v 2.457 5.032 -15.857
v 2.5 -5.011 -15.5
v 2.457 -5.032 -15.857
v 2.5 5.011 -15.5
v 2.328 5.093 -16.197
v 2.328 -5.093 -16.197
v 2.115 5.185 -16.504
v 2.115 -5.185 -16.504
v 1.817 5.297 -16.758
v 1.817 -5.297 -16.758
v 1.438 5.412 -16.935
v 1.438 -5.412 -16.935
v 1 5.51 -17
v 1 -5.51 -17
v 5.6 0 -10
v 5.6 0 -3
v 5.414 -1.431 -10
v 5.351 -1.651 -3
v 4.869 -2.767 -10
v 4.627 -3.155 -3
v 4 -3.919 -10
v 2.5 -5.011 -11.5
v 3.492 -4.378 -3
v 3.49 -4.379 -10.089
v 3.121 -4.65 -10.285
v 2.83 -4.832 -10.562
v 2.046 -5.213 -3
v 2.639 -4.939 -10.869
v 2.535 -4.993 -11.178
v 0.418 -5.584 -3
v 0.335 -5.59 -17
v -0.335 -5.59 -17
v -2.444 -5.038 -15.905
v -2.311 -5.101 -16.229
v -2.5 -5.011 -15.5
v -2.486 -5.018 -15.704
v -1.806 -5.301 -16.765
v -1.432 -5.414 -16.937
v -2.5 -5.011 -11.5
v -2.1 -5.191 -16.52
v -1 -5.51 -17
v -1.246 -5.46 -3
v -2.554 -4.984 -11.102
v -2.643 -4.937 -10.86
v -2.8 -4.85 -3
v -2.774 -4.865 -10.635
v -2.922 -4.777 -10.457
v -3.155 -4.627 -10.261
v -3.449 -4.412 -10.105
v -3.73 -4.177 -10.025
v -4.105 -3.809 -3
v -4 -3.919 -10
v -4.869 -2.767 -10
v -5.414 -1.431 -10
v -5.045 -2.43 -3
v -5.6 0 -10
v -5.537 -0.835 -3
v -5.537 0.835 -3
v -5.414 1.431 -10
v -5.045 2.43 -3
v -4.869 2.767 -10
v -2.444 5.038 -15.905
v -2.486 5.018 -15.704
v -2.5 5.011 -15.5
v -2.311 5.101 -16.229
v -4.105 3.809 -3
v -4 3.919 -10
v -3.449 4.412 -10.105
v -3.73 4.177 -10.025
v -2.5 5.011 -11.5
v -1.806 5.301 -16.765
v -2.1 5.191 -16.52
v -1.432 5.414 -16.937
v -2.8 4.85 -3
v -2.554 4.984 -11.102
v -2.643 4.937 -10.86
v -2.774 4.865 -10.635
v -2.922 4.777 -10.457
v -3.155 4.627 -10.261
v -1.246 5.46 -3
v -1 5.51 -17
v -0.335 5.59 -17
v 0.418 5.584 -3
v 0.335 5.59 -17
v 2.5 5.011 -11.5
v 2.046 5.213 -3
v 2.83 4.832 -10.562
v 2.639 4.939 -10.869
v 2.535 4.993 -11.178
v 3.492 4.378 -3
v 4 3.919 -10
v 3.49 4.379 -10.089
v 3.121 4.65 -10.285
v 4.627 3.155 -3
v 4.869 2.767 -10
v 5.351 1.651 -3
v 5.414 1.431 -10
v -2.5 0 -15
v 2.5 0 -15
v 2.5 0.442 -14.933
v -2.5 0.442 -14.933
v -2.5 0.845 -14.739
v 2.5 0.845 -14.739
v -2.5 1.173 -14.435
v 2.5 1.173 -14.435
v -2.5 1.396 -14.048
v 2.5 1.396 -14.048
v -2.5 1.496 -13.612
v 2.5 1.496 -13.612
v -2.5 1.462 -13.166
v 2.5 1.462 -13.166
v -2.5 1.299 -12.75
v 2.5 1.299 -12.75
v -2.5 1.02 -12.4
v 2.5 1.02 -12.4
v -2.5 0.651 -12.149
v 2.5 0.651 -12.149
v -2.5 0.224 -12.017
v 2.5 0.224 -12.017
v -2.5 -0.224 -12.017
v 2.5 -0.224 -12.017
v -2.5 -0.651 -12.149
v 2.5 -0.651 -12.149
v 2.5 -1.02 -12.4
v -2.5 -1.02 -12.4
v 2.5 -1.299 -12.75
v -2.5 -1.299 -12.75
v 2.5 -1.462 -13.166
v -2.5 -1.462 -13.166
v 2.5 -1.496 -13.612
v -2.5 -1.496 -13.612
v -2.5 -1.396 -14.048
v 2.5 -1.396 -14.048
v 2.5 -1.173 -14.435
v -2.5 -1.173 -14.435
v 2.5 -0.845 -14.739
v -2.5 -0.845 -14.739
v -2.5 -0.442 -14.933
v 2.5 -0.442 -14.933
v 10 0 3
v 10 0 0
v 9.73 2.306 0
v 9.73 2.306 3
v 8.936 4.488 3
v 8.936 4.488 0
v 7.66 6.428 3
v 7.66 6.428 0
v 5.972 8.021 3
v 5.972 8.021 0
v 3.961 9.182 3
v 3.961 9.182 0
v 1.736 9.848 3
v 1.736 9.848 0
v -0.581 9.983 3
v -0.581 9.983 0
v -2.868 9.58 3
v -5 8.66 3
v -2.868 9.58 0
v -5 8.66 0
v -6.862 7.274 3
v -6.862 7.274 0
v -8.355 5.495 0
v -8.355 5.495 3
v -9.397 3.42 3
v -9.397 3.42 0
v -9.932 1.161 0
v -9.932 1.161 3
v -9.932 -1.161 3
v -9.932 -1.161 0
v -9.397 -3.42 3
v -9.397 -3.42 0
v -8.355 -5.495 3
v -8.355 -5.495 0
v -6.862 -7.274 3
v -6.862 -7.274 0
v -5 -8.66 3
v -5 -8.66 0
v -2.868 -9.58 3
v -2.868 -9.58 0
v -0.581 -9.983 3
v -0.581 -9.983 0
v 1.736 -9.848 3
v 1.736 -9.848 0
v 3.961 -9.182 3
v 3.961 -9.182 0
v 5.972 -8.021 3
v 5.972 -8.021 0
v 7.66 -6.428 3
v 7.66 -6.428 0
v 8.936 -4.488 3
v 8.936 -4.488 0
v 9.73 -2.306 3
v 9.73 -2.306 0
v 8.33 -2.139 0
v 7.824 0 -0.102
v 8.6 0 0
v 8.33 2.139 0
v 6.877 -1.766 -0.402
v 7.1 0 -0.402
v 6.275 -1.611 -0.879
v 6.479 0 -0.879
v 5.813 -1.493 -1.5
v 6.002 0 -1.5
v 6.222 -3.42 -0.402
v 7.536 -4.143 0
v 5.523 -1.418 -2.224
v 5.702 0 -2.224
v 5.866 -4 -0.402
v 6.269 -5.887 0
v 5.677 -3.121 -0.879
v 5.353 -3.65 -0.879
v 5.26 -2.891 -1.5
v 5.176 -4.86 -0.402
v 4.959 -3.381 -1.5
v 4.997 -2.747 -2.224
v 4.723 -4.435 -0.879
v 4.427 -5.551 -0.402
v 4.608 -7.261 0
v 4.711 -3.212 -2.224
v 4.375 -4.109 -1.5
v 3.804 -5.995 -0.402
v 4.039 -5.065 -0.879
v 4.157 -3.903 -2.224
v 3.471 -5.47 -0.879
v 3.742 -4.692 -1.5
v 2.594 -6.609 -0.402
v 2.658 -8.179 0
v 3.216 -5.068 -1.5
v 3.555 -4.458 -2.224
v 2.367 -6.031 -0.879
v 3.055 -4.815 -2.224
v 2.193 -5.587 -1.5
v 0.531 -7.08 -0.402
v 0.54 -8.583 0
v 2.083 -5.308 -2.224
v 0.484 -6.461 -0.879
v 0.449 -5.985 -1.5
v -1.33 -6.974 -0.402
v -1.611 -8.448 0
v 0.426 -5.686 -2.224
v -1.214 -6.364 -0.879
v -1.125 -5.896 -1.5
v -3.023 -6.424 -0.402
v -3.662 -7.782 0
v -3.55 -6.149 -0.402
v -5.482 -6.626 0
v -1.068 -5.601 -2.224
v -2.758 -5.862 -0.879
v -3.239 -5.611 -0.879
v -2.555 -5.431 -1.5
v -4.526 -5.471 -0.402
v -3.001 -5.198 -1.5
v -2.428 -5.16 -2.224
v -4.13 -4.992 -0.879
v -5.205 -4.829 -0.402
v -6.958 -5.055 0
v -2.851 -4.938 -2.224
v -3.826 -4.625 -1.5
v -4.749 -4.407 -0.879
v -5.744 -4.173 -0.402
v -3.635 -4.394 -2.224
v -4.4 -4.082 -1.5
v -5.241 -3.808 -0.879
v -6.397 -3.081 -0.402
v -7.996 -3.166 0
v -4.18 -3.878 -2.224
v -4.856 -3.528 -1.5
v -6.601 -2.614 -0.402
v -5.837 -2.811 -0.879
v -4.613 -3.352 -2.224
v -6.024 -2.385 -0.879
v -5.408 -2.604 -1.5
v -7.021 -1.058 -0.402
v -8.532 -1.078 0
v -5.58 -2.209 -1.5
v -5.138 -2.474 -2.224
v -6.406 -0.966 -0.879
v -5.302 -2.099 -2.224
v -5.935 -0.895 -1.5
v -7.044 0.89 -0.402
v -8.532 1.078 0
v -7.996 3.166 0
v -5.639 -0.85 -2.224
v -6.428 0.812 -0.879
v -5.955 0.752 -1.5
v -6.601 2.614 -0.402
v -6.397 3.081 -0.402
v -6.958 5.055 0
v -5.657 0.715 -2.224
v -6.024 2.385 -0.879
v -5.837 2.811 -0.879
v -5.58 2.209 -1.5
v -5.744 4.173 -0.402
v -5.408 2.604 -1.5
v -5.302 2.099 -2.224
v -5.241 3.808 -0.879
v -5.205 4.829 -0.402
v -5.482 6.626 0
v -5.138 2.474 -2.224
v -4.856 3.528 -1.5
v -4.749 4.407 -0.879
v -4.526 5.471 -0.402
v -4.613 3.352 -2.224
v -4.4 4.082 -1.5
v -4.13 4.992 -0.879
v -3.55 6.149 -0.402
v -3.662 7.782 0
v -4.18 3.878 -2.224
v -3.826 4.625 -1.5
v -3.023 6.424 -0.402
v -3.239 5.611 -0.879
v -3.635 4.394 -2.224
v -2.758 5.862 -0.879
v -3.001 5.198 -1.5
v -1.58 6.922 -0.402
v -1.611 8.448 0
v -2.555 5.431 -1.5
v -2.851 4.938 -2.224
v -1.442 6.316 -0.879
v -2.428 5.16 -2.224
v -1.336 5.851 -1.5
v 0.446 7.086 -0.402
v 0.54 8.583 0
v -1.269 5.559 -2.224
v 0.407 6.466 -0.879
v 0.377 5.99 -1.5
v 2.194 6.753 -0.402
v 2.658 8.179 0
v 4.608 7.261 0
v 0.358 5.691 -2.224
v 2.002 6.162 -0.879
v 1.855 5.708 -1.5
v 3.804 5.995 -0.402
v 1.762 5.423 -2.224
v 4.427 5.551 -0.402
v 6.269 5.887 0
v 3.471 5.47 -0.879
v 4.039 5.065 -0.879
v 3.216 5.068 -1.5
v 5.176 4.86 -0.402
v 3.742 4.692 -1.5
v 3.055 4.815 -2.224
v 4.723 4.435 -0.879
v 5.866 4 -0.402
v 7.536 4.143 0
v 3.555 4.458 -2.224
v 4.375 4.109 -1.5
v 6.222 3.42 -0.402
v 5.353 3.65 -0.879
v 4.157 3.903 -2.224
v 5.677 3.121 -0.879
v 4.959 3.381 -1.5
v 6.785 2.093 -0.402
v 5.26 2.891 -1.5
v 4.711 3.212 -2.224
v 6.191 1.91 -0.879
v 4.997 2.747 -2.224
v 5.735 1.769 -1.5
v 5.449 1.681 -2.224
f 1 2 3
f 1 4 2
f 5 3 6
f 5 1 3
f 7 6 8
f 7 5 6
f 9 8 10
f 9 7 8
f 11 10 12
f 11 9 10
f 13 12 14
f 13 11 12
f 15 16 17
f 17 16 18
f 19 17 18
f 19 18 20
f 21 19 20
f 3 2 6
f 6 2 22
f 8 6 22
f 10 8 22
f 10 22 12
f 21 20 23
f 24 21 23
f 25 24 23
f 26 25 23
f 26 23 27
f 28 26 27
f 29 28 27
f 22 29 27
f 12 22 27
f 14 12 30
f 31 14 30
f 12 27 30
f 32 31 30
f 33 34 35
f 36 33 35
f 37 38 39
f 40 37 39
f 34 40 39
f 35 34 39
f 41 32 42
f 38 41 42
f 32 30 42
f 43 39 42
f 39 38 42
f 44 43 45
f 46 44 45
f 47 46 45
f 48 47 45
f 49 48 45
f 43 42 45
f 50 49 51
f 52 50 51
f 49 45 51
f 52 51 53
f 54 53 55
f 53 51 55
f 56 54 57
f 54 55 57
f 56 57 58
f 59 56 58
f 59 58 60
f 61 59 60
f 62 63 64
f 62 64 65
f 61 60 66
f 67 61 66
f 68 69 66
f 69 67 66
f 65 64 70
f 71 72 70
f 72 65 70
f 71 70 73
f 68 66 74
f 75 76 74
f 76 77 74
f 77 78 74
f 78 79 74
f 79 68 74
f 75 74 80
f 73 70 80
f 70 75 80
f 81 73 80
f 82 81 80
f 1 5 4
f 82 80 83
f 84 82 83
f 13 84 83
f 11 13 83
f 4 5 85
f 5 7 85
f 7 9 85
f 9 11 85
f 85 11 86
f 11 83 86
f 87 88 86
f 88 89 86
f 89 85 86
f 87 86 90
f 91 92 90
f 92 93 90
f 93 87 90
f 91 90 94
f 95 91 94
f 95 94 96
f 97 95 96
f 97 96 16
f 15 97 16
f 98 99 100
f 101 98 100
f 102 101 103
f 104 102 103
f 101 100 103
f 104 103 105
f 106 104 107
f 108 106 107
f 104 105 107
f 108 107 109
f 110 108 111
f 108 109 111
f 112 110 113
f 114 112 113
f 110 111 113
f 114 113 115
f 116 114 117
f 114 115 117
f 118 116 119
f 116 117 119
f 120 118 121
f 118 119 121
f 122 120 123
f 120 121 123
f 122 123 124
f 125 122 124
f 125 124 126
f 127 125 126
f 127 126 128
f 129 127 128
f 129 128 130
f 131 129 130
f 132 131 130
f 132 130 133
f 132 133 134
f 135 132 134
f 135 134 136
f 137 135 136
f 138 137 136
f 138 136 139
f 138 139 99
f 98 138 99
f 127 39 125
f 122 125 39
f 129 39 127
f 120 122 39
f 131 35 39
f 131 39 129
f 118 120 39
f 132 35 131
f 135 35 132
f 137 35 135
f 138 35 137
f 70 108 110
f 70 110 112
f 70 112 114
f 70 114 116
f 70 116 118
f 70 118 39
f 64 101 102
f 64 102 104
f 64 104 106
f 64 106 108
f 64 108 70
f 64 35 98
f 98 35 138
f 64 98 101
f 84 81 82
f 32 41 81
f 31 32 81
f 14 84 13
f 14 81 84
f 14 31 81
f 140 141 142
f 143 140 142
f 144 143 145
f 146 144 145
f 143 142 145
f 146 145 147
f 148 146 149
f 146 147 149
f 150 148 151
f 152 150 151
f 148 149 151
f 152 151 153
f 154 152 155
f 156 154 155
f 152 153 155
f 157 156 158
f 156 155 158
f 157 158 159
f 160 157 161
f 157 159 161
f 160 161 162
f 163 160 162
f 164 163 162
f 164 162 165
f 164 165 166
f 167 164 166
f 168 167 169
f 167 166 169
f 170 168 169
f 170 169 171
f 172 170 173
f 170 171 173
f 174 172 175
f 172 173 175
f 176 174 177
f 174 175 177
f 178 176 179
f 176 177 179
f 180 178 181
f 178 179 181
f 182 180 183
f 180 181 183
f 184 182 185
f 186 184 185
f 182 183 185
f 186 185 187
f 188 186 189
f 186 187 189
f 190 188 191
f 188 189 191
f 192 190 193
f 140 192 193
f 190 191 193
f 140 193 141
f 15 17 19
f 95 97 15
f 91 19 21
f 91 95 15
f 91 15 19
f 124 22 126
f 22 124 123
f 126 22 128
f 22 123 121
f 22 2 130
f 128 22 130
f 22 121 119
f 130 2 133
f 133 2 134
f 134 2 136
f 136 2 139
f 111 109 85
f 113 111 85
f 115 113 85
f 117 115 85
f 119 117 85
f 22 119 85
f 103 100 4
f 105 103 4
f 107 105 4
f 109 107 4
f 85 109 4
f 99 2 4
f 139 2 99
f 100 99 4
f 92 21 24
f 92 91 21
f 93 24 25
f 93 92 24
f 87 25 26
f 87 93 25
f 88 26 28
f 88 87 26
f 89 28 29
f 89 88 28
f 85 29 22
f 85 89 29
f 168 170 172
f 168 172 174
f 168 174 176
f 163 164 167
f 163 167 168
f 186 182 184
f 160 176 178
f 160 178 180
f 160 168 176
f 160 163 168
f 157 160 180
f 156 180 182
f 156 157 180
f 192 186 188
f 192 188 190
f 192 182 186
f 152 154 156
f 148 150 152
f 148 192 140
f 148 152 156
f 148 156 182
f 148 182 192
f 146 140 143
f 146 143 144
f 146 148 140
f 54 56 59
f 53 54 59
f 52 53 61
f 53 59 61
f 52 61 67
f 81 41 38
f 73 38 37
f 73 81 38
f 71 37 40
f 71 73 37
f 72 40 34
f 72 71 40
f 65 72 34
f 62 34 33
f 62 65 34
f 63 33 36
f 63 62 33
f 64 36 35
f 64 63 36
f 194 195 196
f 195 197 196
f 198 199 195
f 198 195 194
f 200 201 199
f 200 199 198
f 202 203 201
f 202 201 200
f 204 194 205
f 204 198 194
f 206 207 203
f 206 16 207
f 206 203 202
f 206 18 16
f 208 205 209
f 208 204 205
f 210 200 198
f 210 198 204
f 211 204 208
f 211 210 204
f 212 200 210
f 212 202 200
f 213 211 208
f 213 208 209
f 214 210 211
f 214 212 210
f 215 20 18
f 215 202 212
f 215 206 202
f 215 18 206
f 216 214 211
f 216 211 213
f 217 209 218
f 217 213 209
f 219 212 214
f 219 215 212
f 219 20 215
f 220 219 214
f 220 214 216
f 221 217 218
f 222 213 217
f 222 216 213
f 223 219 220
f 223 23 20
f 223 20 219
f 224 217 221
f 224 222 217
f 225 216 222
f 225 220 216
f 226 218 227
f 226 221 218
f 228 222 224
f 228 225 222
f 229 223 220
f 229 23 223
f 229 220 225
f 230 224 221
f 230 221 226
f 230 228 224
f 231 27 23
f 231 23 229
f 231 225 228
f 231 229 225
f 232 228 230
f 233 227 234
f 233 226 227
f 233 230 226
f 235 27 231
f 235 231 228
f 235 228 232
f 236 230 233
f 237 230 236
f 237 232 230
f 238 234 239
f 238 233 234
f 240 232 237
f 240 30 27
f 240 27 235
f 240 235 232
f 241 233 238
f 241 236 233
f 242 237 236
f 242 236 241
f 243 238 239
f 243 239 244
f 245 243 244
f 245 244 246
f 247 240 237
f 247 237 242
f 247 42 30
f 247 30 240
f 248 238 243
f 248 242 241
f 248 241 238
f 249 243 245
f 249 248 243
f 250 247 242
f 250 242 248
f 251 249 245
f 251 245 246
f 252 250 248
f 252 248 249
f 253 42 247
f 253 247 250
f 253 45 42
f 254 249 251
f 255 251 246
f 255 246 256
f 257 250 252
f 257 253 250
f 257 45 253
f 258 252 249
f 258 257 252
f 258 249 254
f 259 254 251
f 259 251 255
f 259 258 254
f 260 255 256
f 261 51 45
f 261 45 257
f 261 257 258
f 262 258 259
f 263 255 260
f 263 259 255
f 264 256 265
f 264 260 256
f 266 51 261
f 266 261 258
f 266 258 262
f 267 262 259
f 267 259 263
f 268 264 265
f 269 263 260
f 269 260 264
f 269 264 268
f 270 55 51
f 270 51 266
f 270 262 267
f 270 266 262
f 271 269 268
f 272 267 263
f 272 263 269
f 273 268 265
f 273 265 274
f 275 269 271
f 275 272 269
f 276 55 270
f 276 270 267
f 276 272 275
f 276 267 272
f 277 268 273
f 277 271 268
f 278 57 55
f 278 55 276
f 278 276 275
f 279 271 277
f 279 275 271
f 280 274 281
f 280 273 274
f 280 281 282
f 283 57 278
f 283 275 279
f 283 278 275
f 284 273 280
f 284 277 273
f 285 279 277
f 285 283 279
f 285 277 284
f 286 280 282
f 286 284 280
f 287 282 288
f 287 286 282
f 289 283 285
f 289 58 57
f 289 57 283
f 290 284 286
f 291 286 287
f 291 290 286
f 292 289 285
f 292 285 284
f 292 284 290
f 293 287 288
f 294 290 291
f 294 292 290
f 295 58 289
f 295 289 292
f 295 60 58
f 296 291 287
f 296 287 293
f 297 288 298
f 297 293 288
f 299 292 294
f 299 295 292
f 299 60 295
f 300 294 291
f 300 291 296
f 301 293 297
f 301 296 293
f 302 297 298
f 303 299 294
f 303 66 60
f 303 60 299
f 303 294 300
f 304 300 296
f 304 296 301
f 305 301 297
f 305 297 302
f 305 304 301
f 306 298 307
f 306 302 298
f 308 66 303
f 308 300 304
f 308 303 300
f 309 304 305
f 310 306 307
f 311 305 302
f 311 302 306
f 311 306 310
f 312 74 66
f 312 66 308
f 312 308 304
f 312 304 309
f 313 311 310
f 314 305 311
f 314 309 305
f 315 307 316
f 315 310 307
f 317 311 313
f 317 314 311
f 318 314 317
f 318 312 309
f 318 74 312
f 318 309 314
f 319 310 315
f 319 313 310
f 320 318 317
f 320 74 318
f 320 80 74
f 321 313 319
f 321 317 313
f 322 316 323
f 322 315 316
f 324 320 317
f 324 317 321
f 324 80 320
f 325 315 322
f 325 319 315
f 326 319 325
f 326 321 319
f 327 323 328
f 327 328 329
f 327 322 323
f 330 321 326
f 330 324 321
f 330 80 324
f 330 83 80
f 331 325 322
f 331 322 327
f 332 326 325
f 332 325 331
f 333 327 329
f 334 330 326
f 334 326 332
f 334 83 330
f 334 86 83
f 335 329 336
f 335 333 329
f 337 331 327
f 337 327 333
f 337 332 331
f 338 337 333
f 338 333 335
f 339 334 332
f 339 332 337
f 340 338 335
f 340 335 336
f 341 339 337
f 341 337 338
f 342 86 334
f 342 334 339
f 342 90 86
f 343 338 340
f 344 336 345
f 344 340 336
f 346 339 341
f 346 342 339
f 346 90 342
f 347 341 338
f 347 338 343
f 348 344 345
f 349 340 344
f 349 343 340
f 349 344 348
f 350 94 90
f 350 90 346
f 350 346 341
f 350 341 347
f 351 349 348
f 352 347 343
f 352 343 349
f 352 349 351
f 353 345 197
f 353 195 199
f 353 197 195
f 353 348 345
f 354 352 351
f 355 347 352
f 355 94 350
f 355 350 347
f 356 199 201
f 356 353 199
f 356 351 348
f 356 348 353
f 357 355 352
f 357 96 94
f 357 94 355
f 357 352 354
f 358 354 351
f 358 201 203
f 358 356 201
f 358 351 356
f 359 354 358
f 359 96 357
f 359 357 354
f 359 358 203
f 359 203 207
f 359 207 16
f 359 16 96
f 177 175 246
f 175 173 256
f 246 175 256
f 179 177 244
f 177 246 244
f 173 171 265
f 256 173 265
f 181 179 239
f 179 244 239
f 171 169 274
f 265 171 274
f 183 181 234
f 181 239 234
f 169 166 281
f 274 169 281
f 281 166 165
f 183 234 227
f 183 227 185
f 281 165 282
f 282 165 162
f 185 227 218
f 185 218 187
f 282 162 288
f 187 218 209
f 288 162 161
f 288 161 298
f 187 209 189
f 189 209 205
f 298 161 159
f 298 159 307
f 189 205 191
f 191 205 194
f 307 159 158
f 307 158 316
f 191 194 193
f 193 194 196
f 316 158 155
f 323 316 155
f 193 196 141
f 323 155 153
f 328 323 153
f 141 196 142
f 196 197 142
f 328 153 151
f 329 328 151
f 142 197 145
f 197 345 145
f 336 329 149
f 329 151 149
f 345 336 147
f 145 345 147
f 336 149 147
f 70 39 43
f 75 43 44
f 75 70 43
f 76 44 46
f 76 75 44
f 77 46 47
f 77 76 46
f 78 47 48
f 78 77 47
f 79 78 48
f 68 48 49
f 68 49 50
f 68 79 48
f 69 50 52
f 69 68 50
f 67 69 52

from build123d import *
from OCP.BRepFilletAPI import BRepFilletAPI_MakeFillet

# Parameters (mm, degrees)
SKETCH1_R           = 10
BOSS_EXTRUDE1_DEPTH = 3
SKETCH2_R           = 5.6
BOSS_EXTRUDE2_DEPTH = 17
CUT_EXTRUDE1_DEPTH  = 7
CUT_EXTRUDE2_REACH  = 25.351
SKETCH4_R           = 1.5
FILLET1_R1          = 3
FILLET1_R2          = 1.5


with BuildPart() as part:
    # Sketch1 → Boss-Extrude1 (new body)
    with BuildSketch(Plane.XY):
        Circle(SKETCH1_R)
    extrude(amount=BOSS_EXTRUDE1_DEPTH)

    # Sketch2 → Boss-Extrude2 (add)
    with BuildSketch(Plane(origin=(0, 0, 0), x_dir=(-1, 0, 0), z_dir=(0, 0, -1))):
        Circle(SKETCH2_R)
    extrude(amount=BOSS_EXTRUDE2_DEPTH)

    # Sketch3 → Cut-Extrude1 (cut)
    with BuildSketch(Plane(origin=(0, 0, -17), x_dir=(-1, 0, 0), z_dir=(0, 0, -1))):
        with BuildLine():
            Line((2.5, 0), (2.5, 6.663171691))
            ThreePointArc((2.5, 6.663171691), (8.066213365, -0.537352556), (2.5, -7.737876802))
            Line((2.5, -7.737876802), (2.5, 0))
        make_face()
        with BuildLine():
            Line((-2.5, 0), (-2.5, 6.663171691))
            ThreePointArc((-2.5, 6.663171691), (-7.668145551, -0.537352556), (-2.5, -7.737876802))
            Line((-2.5, -7.737876802), (-2.5, 0))
        make_face()
    extrude(amount=-CUT_EXTRUDE1_DEPTH, mode=Mode.SUBTRACT)

    # Sketch4 → Cut-Extrude2 (cut, up to next)
    with BuildSketch(Plane(origin=(2.5, 0, 0), x_dir=(0, 0, -1), z_dir=(1, 0, 0)), mode=Mode.PRIVATE) as cut_extrude2_sk1:
        with Locations((13.5, 0)):
            Circle(SKETCH4_R)
    cut_extrude2_tool1 = extrude(cut_extrude2_sk1.sketch, amount=-CUT_EXTRUDE2_REACH, mode=Mode.PRIVATE) & part.part
    add(cut_extrude2_tool1.solids().sort_by_distance((2.5, 0, -13.5))[0], mode=Mode.SUBTRACT)

    # Fillet1: one fillet with a radius per group of edges: ONE call of the kernel's fillet builder (fillet() takes one radius for all edges)
    fillet1_edges_1 = [part.edges().sort_by_distance(p)[0] for p in [
        (5.6, 0, 0),
    ]]
    fillet1_edges_2 = [part.edges().sort_by_distance(p)[0] for p in [
        (2.5, 0, -10),
        (-2.5, 0, -10),
        (2.5, 0, -17),
        (-2.5, 0, -17),
    ]]
    fillet1 = BRepFilletAPI_MakeFillet(part.part.solid().wrapped)
    for e in fillet1_edges_1:
        fillet1.Add(FILLET1_R1, e.wrapped)
    for e in fillet1_edges_2:
        fillet1.Add(FILLET1_R2, e.wrapped)
    add(Compound.cast(fillet1.Shape()), mode=Mode.REPLACE)


solid = part.part
